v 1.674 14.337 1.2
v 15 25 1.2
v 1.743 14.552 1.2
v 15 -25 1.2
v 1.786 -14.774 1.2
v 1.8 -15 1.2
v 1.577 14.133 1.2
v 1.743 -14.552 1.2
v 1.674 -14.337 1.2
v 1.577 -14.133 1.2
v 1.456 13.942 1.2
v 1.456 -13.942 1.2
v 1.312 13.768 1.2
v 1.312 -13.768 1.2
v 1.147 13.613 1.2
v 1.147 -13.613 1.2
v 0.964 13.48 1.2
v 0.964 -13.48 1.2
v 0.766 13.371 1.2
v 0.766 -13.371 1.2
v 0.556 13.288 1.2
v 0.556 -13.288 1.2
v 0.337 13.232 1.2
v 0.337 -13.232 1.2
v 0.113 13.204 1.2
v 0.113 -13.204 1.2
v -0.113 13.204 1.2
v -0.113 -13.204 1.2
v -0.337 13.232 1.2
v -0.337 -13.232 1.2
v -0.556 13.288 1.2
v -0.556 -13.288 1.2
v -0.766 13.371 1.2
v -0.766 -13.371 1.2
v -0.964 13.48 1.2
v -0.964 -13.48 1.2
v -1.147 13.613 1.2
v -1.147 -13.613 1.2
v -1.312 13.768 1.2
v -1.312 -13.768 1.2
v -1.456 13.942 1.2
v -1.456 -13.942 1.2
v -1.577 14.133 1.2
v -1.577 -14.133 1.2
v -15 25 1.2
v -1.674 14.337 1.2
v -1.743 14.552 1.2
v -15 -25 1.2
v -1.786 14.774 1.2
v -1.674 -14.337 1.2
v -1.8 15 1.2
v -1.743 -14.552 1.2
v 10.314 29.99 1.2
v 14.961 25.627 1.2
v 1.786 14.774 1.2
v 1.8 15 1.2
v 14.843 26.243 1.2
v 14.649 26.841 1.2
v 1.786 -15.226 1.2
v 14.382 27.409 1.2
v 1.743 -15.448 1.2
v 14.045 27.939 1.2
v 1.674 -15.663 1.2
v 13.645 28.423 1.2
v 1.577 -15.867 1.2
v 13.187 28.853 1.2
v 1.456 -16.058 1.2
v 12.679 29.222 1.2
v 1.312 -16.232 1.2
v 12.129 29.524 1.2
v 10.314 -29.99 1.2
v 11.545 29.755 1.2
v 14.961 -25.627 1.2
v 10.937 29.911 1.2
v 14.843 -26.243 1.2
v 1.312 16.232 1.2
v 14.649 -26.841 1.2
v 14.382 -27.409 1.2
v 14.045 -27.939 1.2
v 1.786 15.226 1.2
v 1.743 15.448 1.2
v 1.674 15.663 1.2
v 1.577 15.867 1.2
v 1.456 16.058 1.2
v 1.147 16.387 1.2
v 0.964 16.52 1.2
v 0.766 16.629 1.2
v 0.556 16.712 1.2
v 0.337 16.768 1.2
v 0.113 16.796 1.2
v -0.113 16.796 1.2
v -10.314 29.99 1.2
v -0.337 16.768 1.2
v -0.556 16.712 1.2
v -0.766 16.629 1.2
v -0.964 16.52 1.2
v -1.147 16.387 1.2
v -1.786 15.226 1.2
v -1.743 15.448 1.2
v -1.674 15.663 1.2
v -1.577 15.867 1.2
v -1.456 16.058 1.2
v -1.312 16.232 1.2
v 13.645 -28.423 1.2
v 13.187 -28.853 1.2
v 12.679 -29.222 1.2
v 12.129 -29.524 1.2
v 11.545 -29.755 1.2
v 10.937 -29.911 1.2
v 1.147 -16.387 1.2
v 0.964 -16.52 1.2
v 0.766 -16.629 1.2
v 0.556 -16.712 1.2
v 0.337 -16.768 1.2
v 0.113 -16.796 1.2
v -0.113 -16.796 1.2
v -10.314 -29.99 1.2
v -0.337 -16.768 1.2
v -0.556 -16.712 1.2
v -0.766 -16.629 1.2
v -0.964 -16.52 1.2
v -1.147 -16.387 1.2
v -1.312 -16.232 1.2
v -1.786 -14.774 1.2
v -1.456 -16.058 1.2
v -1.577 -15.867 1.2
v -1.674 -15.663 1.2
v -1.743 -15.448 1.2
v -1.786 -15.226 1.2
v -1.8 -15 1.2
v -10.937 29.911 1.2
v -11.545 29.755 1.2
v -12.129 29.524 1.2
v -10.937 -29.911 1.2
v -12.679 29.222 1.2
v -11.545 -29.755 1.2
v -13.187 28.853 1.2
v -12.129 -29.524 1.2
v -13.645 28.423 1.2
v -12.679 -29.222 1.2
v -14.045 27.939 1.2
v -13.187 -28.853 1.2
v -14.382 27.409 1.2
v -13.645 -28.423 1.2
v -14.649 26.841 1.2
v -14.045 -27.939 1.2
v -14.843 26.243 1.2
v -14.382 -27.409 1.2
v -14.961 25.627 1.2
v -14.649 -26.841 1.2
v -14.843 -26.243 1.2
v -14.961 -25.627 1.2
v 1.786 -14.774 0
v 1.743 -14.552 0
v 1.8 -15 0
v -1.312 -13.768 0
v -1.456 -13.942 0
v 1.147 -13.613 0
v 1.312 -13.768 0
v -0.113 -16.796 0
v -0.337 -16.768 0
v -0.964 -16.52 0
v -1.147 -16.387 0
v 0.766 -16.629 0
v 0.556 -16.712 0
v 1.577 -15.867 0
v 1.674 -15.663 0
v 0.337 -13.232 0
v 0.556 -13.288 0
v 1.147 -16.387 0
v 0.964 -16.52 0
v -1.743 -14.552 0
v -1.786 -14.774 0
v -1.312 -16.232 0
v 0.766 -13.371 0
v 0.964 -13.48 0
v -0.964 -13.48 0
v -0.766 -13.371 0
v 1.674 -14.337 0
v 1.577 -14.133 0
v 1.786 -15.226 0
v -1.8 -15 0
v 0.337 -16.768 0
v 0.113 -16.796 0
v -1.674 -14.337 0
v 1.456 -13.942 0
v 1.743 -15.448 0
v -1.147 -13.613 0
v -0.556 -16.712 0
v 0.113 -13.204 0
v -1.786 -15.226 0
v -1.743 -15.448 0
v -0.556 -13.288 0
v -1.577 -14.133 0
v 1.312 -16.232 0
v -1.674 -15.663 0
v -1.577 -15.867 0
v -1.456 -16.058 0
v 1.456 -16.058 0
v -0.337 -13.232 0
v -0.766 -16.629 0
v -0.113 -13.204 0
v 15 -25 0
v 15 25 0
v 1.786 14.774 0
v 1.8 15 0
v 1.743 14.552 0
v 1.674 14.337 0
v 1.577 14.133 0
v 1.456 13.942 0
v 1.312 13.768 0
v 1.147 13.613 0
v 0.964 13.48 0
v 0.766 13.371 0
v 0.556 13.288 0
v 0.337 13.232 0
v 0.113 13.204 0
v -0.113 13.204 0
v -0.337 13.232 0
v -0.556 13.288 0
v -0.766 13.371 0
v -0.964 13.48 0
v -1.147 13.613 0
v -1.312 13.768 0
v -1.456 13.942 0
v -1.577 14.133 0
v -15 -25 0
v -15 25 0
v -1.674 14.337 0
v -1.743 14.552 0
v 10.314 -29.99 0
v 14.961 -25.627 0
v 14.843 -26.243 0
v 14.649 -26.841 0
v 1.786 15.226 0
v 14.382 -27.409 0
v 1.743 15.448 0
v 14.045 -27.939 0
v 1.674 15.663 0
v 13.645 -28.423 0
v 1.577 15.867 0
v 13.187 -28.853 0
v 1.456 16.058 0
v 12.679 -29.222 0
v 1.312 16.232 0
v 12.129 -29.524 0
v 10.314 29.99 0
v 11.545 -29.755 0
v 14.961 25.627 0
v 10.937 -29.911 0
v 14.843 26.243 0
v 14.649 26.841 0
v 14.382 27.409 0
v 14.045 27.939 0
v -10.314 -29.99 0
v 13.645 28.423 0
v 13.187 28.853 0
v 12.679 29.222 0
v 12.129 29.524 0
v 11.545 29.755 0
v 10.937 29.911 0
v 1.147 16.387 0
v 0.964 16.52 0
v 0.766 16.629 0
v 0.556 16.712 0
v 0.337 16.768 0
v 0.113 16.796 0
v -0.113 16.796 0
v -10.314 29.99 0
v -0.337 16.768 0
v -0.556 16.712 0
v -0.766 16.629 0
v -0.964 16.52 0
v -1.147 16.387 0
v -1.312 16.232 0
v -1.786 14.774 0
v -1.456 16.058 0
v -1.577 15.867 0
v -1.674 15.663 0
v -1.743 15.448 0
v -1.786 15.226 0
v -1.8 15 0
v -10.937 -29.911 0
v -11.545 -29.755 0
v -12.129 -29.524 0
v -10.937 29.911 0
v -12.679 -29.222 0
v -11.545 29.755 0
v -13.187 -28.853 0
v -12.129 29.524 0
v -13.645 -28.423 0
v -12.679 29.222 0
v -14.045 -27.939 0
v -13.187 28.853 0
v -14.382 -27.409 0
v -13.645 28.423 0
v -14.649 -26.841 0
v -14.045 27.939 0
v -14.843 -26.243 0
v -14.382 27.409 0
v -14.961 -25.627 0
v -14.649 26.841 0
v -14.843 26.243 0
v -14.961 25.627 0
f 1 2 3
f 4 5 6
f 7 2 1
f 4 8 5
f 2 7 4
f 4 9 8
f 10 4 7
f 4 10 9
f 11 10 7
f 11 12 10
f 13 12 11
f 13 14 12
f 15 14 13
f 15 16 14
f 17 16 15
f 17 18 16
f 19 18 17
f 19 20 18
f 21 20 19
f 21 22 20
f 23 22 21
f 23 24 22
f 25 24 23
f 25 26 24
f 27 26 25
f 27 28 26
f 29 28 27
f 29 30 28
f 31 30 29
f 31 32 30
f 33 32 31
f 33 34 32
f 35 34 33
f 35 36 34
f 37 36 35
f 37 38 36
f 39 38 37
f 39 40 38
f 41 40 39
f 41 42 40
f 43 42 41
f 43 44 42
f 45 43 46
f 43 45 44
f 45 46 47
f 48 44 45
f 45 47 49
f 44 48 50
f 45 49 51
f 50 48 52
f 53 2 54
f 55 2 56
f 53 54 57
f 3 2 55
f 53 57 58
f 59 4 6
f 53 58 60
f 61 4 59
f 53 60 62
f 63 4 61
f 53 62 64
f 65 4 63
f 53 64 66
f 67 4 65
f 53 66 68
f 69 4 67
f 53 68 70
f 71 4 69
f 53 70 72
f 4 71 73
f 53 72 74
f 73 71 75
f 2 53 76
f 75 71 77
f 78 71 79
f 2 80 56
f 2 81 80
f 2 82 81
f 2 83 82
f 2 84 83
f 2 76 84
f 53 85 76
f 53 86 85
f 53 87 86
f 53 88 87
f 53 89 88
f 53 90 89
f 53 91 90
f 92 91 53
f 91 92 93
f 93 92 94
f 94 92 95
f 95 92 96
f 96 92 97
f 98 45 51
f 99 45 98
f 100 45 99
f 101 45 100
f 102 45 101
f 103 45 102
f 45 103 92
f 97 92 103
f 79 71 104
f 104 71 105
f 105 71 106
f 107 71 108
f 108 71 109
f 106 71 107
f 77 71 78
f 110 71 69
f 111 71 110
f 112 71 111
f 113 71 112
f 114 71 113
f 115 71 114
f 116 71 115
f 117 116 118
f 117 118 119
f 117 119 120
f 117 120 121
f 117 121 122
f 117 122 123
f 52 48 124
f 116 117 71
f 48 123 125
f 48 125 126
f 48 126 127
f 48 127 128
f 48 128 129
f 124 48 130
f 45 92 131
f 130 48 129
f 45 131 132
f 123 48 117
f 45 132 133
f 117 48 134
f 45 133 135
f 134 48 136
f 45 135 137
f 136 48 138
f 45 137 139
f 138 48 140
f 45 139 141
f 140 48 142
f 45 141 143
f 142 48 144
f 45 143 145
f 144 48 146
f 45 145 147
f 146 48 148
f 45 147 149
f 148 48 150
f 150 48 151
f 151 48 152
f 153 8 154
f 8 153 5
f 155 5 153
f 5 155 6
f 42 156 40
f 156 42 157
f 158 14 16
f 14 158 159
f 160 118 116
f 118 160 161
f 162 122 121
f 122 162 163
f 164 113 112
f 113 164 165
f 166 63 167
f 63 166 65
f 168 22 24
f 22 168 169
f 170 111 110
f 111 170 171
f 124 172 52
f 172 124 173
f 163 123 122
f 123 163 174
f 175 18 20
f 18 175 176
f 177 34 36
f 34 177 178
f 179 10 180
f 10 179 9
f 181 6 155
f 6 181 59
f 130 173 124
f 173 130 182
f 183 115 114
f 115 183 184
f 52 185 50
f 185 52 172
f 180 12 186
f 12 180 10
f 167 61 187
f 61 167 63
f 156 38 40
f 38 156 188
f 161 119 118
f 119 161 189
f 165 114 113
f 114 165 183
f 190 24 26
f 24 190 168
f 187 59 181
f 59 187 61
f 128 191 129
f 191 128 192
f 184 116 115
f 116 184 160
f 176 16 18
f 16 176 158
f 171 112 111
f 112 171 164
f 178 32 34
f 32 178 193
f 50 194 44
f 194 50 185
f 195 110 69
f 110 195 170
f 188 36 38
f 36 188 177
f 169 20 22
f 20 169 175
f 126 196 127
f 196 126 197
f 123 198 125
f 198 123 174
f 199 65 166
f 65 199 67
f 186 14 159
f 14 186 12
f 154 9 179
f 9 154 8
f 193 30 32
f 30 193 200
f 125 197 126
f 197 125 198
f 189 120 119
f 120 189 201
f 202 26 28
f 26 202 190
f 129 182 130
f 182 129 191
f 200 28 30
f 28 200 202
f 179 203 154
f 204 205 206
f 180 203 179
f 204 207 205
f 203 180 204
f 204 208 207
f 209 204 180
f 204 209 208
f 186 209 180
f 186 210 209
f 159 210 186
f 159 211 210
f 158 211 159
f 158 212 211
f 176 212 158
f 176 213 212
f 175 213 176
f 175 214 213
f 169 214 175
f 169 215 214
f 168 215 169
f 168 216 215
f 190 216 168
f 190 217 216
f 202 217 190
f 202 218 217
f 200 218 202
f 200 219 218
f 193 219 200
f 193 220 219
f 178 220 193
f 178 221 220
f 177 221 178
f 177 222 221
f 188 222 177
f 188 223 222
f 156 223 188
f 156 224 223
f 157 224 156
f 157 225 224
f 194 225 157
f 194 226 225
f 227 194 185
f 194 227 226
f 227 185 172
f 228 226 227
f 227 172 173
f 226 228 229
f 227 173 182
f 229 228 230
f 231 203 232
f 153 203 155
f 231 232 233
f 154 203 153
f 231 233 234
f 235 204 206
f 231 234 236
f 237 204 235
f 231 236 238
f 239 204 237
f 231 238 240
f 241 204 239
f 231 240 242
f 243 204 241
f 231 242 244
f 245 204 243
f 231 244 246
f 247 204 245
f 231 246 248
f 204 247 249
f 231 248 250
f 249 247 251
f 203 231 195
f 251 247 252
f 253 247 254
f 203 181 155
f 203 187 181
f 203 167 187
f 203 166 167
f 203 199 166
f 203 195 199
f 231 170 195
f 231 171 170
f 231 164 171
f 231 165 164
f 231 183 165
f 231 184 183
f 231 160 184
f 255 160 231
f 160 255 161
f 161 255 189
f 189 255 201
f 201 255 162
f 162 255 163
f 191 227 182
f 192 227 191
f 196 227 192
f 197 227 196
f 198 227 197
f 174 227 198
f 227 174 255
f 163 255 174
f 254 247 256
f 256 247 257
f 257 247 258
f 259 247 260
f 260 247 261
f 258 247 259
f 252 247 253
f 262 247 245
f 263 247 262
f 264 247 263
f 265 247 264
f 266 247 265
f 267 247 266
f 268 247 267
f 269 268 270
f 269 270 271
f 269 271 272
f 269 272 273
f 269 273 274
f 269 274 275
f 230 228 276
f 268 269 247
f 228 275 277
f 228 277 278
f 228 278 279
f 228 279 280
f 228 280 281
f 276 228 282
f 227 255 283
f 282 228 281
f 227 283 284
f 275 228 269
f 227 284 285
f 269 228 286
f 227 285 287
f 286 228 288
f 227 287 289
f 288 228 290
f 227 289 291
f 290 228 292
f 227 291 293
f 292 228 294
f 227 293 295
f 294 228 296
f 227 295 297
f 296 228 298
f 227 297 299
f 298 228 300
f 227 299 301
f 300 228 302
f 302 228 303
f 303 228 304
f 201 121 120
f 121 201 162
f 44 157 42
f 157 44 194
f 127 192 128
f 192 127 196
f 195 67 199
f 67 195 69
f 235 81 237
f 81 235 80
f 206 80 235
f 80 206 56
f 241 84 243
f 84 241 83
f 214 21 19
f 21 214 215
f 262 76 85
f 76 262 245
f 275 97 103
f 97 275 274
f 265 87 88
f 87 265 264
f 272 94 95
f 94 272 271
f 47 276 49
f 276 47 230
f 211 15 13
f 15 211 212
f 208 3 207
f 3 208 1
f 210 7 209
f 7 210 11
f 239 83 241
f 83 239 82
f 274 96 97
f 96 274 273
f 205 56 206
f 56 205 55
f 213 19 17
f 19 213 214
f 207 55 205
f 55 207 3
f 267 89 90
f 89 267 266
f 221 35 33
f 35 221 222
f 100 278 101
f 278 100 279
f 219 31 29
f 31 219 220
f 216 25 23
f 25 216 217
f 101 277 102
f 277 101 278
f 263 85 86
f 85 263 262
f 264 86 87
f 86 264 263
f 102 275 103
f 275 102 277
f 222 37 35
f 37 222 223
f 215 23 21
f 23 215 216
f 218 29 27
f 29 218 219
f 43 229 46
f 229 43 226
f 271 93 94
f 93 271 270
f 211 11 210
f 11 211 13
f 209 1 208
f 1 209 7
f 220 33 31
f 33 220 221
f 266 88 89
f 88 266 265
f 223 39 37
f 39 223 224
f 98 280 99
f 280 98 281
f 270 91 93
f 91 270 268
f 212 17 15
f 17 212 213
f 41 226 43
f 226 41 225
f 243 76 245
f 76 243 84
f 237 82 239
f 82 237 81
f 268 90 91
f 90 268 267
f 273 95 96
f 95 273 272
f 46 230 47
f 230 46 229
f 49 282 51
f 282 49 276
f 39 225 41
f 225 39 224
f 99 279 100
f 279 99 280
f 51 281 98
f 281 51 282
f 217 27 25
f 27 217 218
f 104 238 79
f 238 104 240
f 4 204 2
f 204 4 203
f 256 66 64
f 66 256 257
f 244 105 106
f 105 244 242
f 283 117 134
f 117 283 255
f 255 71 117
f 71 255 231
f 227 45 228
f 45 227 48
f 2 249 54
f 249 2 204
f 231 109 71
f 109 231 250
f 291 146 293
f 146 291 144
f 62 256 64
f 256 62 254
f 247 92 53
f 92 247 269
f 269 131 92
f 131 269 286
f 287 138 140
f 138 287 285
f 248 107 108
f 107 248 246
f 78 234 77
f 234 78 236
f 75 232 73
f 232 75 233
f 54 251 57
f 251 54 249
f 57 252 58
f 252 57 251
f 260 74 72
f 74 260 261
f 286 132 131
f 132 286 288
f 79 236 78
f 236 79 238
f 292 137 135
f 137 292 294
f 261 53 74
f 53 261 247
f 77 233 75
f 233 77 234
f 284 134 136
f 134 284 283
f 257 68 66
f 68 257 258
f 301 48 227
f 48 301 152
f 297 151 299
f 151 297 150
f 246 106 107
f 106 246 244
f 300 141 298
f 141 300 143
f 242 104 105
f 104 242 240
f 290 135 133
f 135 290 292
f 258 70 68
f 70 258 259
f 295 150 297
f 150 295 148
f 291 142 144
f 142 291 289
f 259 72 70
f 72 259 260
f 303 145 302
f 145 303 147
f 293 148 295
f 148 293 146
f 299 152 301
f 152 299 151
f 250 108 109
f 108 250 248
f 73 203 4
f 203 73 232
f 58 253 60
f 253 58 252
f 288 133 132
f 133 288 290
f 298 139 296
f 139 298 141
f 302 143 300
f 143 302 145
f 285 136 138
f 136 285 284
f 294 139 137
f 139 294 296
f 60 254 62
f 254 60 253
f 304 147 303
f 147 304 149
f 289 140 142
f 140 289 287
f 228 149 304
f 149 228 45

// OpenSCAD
$fn = 50;


difference() {
	union() {
		hull() {
			translate(v = [-10.0000000000, 25.0000000000, 0]) {
				cylinder(h = 18, r = 5);
			}
			translate(v = [10.0000000000, 25.0000000000, 0]) {
				cylinder(h = 18, r = 5);
			}
			translate(v = [-10.0000000000, -25.0000000000, 0]) {
				cylinder(h = 18, r = 5);
			}
			translate(v = [10.0000000000, -25.0000000000, 0]) {
				cylinder(h = 18, r = 5);
			}
		}
	}
	union() {
		translate(v = [0, 0, 1.2000000000]) {
			hull() {
				translate(v = [-10.0000000000, 25.0000000000, 0]) {
					cylinder(h = 16.8000000000, r = 3.8000000000);
				}
				translate(v = [10.0000000000, 25.0000000000, 0]) {
					cylinder(h = 16.8000000000, r = 3.8000000000);
				}
				translate(v = [-10.0000000000, -25.0000000000, 0]) {
					cylinder(h = 16.8000000000, r = 3.8000000000);
				}
				translate(v = [10.0000000000, -25.0000000000, 0]) {
					cylinder(h = 16.8000000000, r = 3.8000000000);
				}
			}
		}
		#translate(v = [0.0000000000, -15.0000000000, 0]) {
			cylinder(h = 1.2000000000, r = 1.8000000000);
		}
		#translate(v = [0.0000000000, 15.0000000000, 0]) {
			cylinder(h = 1.2000000000, r = 1.8000000000);
		}
		translate(v = [-250.0000000000, -250.0000000000, 1.2000000000]) {
			cube(size = [500, 500, 500]);
		}
		translate(v = [-250.0000000000, -250.0000000000, 1.2000000000]) {
			cube(size = [500, 500, 500]);
		}
		translate(v = [-250.0000000000, -250.0000000000, 1.2000000000]) {
			cube(size = [500, 500, 500]);
		}
	}
}
